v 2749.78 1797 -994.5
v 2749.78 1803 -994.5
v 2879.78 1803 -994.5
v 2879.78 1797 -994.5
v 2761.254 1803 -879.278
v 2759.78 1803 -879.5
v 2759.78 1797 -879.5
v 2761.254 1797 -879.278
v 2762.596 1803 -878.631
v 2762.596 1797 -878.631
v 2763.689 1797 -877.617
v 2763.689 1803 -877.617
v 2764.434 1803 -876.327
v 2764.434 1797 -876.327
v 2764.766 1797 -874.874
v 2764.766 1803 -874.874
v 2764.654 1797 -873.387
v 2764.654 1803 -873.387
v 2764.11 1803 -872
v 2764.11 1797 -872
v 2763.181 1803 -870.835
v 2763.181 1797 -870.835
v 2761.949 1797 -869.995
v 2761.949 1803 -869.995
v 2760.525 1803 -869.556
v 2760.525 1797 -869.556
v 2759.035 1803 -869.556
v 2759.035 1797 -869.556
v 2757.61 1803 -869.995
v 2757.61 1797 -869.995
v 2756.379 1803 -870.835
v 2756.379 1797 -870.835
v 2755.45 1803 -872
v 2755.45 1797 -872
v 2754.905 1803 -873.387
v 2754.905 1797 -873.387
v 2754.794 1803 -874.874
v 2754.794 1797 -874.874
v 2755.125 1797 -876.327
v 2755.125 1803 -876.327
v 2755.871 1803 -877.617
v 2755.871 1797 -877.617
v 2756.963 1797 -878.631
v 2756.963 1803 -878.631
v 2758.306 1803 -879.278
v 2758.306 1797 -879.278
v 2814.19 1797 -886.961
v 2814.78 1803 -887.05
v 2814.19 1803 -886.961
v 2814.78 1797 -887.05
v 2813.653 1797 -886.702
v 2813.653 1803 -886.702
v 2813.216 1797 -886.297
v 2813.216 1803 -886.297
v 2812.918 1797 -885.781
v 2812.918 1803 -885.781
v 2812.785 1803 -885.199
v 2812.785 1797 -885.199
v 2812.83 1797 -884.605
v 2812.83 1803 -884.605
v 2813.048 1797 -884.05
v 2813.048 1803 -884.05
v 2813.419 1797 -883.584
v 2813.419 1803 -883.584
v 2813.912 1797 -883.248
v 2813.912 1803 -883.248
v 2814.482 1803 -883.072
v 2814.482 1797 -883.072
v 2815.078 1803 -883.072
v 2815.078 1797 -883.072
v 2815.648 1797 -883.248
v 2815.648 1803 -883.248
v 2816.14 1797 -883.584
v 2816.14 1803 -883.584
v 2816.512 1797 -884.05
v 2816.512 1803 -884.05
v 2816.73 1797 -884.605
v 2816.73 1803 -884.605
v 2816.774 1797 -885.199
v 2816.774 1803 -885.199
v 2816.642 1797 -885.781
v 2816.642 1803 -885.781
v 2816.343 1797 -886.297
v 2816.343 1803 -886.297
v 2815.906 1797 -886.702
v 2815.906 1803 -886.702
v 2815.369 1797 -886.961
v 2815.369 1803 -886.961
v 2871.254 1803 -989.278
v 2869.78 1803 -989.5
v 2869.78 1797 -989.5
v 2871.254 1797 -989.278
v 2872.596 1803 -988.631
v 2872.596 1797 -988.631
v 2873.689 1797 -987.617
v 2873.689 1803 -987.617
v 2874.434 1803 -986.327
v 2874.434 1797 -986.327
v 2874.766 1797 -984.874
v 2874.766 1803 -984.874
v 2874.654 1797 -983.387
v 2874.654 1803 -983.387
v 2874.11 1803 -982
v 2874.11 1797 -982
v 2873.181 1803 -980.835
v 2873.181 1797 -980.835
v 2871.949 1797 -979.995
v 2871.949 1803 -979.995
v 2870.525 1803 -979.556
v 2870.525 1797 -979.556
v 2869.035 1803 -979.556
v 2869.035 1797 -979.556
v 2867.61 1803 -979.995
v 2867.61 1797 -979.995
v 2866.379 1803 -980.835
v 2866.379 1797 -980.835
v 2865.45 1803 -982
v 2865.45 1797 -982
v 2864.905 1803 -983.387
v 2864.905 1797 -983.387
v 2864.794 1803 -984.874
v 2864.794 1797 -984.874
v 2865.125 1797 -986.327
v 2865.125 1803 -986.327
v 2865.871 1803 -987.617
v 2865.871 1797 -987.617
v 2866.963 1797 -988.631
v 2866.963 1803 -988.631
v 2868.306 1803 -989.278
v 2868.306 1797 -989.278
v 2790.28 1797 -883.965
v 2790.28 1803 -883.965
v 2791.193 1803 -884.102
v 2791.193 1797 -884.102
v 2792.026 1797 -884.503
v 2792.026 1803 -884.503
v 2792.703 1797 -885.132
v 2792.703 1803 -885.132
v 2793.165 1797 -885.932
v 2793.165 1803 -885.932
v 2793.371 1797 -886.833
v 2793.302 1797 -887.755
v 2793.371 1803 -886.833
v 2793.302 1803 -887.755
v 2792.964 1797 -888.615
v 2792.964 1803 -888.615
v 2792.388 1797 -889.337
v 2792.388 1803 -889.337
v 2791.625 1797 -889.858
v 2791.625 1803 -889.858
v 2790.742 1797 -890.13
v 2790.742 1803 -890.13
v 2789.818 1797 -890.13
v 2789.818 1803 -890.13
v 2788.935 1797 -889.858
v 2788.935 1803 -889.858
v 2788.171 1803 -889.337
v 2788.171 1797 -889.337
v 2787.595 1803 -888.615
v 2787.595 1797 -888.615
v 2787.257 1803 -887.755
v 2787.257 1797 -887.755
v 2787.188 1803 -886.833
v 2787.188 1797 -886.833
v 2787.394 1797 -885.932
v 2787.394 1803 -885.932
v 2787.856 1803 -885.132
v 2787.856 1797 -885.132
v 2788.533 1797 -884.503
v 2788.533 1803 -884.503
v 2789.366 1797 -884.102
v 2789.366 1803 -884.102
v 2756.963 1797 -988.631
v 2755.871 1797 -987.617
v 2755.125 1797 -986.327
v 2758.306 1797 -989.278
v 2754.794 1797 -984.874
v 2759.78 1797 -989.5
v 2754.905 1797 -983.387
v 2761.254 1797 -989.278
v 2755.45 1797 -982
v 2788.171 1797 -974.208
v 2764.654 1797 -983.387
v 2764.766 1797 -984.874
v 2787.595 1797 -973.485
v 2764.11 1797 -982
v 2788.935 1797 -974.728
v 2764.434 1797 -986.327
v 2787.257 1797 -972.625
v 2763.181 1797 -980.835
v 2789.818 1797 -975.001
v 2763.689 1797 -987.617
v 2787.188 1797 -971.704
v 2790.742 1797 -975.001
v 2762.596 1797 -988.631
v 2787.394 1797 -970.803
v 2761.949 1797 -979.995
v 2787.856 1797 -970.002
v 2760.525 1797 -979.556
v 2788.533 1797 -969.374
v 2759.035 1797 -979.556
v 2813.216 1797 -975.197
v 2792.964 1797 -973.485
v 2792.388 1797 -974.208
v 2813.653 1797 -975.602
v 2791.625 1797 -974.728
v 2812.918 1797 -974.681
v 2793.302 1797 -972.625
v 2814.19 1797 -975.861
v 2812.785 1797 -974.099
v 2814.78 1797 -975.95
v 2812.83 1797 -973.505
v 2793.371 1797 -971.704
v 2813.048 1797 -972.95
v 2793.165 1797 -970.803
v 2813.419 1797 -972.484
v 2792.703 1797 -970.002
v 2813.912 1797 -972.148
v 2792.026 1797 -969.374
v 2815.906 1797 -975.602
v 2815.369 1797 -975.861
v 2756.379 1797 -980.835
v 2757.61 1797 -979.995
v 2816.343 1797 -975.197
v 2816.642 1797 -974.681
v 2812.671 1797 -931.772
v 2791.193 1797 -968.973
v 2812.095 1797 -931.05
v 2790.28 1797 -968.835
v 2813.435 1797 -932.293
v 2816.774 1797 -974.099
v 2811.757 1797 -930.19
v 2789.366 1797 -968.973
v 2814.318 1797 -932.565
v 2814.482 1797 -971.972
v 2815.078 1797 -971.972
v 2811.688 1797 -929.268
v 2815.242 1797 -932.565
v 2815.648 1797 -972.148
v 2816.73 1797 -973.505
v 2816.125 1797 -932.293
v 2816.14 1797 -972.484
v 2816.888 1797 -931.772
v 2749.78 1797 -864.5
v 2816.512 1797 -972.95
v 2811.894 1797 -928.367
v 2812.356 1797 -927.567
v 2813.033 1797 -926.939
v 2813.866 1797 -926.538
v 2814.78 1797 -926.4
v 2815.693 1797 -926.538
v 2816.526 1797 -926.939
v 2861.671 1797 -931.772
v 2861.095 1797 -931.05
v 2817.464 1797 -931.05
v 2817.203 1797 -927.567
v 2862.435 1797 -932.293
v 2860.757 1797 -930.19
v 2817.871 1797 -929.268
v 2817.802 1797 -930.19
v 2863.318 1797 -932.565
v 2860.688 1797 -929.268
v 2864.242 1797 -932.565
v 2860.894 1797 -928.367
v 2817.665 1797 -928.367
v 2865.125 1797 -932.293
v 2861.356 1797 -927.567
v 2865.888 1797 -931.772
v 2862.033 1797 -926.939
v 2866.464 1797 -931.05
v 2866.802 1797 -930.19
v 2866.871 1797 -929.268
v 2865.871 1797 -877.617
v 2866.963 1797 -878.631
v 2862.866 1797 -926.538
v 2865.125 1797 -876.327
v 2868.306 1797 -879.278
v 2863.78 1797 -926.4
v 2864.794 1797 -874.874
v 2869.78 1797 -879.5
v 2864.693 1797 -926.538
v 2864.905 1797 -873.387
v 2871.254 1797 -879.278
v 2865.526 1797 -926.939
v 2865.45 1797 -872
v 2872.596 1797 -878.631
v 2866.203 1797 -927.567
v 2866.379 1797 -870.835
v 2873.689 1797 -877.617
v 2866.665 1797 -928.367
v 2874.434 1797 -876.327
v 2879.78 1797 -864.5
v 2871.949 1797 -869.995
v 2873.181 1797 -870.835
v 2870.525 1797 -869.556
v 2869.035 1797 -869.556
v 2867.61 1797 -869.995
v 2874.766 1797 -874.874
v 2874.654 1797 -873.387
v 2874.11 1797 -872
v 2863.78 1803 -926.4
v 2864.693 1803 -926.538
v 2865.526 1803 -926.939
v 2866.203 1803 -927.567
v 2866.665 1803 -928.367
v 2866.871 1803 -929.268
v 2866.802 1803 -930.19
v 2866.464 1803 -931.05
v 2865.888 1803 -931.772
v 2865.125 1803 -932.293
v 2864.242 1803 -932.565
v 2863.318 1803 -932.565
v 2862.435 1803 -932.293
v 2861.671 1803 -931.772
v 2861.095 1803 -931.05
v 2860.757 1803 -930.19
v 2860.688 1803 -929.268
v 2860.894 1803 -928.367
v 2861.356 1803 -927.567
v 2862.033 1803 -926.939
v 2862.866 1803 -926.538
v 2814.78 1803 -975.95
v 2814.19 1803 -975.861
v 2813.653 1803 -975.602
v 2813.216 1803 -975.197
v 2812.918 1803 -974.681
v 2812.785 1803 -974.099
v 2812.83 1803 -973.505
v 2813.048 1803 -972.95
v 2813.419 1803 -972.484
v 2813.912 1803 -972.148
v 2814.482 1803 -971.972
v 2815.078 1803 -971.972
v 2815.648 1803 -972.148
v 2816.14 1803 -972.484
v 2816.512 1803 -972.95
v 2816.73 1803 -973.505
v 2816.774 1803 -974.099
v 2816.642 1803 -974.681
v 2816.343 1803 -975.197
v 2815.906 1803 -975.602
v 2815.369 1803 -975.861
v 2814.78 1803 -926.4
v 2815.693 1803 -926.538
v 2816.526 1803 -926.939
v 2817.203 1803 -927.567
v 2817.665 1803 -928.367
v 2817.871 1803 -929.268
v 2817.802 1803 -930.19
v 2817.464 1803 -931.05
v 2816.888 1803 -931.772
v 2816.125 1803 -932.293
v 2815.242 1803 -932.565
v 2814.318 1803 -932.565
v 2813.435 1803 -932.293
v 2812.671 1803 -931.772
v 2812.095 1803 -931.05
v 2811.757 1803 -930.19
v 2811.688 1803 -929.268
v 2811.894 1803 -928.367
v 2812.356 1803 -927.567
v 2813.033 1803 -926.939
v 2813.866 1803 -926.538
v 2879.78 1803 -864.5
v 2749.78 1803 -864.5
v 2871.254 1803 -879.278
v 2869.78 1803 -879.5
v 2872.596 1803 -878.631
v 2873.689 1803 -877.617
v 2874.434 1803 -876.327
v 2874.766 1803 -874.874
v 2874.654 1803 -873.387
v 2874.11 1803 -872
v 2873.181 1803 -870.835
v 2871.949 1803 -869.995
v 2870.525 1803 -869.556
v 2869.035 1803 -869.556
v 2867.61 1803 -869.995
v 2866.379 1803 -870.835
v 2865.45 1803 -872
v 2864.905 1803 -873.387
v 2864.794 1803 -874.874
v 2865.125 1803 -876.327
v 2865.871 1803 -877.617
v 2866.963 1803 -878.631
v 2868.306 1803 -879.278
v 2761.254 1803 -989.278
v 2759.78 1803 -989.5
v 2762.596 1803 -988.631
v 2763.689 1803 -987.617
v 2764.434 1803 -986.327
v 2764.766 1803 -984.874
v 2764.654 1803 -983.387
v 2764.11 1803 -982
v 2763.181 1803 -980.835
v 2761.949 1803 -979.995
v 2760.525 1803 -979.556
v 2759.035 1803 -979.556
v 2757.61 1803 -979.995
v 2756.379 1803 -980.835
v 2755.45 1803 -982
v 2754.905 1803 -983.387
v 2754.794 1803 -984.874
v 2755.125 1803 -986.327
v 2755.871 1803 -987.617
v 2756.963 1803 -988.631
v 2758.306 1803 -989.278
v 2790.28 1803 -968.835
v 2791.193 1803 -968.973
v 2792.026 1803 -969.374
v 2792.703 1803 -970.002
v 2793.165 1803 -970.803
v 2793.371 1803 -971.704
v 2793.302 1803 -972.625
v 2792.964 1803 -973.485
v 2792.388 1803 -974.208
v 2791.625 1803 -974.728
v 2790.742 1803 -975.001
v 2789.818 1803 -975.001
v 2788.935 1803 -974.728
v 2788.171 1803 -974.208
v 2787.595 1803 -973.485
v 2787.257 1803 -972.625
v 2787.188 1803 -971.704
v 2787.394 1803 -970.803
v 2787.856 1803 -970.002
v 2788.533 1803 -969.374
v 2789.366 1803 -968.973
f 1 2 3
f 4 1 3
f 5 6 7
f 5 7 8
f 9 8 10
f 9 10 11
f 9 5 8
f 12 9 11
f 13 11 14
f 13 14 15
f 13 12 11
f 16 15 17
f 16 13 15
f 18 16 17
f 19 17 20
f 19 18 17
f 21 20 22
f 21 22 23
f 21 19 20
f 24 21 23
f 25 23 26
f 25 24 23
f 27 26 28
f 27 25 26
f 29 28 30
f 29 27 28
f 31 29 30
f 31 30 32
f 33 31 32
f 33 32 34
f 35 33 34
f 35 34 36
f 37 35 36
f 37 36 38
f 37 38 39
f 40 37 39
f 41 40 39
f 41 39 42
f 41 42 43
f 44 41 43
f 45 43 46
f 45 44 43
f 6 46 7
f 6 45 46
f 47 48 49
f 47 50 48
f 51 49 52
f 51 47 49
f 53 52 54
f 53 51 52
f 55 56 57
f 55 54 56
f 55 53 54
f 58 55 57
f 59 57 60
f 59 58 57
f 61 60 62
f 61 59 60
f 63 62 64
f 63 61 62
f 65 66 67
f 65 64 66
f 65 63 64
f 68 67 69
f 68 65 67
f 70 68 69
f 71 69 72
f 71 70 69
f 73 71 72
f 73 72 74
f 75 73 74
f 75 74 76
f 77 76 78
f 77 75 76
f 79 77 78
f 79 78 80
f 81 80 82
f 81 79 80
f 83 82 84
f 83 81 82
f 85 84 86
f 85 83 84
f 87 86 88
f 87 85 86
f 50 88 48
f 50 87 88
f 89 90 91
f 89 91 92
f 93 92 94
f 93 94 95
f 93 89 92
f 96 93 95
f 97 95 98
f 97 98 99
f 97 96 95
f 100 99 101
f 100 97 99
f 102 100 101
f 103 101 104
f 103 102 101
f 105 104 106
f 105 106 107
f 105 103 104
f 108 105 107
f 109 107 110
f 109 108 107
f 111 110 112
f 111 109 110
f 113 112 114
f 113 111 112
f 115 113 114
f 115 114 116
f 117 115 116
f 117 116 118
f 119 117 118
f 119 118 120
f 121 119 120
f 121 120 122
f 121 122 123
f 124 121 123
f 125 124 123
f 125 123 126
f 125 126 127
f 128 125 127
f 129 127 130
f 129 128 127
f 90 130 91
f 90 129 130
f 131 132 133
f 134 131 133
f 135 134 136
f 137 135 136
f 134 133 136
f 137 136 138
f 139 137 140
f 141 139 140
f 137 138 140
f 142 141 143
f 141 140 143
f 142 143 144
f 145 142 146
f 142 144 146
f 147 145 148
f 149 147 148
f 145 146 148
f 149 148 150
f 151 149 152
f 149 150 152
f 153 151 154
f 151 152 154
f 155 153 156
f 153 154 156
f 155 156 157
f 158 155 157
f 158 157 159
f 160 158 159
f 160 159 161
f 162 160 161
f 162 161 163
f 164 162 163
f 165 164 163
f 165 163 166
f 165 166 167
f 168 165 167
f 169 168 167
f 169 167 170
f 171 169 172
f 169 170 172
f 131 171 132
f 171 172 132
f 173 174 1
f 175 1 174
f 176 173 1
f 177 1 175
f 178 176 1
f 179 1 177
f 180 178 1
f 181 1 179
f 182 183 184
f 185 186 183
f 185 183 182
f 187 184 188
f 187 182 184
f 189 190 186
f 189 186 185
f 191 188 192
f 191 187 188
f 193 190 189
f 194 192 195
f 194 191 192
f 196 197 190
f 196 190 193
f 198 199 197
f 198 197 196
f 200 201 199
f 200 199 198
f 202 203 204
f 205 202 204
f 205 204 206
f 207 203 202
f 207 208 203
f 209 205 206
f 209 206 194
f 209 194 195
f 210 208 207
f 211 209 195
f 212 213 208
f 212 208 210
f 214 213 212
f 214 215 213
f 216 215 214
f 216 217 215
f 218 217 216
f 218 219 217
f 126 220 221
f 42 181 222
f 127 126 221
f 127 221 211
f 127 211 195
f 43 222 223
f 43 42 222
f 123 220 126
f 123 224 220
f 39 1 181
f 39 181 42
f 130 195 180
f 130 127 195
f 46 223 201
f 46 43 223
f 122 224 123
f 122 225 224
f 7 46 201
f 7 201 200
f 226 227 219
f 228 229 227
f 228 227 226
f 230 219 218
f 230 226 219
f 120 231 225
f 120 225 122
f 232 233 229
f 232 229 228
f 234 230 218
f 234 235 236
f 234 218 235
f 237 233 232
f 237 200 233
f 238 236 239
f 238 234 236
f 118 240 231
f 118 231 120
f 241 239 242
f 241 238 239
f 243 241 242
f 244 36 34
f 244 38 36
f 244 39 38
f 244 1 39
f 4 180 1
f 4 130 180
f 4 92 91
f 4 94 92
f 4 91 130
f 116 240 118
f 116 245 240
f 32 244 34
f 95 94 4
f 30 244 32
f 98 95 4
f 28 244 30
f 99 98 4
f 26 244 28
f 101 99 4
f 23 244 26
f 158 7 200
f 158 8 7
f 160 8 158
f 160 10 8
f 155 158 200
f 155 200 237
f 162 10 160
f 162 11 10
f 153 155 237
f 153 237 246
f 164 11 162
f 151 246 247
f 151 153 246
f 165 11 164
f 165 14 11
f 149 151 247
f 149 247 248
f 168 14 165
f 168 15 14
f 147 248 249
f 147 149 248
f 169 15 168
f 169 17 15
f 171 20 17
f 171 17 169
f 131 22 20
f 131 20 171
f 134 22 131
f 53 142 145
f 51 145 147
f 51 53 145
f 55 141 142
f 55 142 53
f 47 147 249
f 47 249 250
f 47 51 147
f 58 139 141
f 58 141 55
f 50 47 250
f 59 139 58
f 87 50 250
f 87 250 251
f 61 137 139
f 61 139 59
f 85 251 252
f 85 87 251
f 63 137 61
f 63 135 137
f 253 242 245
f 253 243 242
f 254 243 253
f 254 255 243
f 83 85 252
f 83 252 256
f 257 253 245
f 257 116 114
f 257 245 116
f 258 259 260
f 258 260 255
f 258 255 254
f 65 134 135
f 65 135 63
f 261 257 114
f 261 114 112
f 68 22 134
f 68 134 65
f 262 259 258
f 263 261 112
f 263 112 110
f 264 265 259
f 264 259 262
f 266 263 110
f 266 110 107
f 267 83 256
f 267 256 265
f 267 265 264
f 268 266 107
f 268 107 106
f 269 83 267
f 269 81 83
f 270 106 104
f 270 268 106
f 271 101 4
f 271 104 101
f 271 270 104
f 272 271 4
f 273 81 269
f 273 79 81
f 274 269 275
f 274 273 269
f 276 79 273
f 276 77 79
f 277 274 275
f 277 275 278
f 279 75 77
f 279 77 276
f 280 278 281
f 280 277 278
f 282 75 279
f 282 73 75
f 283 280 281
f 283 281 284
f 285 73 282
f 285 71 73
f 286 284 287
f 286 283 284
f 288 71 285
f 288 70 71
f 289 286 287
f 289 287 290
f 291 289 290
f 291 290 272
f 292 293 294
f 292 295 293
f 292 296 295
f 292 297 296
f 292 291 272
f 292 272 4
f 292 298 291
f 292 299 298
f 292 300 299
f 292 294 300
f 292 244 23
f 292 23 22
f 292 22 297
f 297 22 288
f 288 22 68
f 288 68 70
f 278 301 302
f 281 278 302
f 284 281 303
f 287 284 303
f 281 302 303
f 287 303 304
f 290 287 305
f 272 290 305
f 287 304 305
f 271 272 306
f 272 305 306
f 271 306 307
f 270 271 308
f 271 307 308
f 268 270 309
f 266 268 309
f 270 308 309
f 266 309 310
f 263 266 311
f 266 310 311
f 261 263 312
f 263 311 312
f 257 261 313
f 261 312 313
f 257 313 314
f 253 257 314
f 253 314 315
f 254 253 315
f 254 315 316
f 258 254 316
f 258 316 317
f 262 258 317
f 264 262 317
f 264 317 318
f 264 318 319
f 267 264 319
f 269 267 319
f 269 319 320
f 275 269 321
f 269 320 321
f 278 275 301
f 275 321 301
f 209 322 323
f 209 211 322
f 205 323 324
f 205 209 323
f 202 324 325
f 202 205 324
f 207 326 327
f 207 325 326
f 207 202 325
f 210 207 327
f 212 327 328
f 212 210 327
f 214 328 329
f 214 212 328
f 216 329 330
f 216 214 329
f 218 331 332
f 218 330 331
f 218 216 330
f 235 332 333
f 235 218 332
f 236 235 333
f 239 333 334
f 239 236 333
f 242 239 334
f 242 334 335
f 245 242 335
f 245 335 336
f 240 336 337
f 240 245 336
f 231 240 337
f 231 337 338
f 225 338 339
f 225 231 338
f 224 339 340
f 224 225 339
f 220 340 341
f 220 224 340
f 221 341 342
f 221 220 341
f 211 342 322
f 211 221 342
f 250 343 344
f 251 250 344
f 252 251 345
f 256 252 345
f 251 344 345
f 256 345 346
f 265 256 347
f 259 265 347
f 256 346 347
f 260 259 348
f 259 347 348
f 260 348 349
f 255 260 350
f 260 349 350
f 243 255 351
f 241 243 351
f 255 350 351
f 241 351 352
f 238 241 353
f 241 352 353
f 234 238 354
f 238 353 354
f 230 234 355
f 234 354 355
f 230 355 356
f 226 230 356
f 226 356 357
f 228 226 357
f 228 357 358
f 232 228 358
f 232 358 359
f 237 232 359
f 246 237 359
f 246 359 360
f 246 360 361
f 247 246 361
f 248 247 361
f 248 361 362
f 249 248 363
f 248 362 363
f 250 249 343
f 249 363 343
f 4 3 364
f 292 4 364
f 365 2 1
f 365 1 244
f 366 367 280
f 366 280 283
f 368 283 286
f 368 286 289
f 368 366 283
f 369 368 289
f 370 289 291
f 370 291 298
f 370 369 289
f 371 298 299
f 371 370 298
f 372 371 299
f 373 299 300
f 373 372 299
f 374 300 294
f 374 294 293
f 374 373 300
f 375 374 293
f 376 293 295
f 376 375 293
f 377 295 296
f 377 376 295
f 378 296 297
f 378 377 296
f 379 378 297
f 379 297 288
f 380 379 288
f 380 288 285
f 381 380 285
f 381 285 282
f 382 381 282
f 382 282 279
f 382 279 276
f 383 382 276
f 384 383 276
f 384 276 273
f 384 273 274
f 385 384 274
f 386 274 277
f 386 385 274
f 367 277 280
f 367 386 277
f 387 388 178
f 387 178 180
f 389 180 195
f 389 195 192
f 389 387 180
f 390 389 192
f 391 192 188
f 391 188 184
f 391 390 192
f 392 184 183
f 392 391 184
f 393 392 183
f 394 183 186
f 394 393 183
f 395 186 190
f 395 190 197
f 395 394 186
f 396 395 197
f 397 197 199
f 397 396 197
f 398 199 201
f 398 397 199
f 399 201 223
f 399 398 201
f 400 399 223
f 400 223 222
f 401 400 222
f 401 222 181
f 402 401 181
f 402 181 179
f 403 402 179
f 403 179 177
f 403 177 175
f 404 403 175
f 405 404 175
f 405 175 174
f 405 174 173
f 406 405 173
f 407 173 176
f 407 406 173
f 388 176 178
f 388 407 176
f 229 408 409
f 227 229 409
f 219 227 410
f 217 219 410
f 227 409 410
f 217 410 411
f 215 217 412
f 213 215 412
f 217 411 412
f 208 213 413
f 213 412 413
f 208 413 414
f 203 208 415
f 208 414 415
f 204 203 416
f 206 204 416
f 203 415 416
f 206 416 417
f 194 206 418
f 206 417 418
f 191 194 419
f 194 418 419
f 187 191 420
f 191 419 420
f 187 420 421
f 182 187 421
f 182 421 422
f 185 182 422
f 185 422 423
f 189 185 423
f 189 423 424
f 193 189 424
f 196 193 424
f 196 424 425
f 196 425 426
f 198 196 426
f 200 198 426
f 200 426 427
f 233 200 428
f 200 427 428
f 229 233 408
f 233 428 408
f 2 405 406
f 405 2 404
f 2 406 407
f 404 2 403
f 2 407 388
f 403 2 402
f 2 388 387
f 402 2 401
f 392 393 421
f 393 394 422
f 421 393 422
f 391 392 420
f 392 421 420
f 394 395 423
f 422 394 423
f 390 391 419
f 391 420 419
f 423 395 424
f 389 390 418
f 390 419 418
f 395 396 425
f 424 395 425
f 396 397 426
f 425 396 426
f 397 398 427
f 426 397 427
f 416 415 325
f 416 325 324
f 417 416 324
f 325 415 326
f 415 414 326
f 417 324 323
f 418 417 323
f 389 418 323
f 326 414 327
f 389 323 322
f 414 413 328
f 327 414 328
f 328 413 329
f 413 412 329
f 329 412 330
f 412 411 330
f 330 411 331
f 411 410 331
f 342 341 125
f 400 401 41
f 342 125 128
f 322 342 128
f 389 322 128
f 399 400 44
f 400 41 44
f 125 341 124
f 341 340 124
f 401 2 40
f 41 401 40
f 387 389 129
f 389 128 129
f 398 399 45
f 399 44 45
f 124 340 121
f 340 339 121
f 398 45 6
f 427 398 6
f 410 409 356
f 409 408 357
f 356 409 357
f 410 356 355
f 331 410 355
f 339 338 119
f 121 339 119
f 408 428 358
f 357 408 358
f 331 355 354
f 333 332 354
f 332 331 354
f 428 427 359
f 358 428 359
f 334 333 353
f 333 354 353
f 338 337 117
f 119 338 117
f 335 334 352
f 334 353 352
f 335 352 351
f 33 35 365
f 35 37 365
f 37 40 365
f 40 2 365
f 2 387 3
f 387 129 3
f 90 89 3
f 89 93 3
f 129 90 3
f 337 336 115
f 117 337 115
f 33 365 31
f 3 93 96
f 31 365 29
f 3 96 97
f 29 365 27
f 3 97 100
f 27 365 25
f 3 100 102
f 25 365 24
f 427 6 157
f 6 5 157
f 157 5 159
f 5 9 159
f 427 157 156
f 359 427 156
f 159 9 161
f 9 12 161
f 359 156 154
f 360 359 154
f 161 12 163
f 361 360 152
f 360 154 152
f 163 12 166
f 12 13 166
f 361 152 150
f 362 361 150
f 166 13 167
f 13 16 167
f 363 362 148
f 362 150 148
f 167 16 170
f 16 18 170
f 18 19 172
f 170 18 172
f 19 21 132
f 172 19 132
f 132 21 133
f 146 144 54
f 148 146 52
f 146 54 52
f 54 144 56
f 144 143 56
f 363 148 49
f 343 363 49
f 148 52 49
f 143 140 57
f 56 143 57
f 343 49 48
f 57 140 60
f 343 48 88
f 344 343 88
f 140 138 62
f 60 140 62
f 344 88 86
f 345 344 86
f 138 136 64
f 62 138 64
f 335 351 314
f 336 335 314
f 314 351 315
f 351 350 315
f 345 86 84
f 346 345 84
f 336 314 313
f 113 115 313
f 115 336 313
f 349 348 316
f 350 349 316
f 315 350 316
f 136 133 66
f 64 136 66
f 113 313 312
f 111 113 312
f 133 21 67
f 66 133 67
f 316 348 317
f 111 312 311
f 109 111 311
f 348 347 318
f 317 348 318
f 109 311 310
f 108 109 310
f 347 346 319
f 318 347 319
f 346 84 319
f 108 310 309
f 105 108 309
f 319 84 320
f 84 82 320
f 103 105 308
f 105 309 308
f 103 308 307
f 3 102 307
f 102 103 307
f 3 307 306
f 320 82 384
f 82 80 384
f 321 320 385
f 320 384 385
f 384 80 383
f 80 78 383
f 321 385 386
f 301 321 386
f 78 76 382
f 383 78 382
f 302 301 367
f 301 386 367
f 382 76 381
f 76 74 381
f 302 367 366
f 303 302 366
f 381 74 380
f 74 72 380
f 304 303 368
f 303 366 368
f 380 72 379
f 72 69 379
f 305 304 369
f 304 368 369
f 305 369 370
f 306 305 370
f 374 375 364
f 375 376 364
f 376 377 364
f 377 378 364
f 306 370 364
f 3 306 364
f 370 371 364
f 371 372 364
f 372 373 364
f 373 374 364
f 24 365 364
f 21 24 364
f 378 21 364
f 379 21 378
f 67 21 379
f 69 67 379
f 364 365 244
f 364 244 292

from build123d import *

# Parameters (mm, degrees)
SKETCH_8_R          = 58
SKETCH_8_R_2        = 3
EXTRUDE_5_DEPTH     = 6
SKETCH_9_R          = 2
EXTRUDE_6_DEPTH     = 12
EXTRUDE_START       = -6
SKETCH_10_W         = 130
SKETCH_10_H         = 130
SKETCH_10_R         = 5
SKETCH_10_R_2       = 58
EXTRUDE_8_DEPTH     = 6
CUT_EXTRUDE_START   = -30
SKETCH_12_R         = 2
CUT_EXTRUDE_1_DEPTH = 30
SKETCH_13_R         = 2
CUT_EXTRUDE_2_DEPTH = 30
SKETCH_14_R         = 3.1
CUT_EXTRUDE_3_DEPTH = 6
SKETCH_15_R         = 3.1
CUT_EXTRUDE_4_DEPTH = 6


with BuildPart() as part:
    # 草图8 → 凸台-拉伸5 (new body)
    with BuildSketch(Plane.XZ.offset(-1803)):
        with Locations(Location((2814.779756067, -929.5, 0), (0, 0, 270))):
            Circle(SKETCH_8_R)
        with Locations(Location((2814.779756067, -929.5, 0), (0, 0, 270))):
            Circle(SKETCH_8_R_2, mode=Mode.SUBTRACT)
    extrude(amount=EXTRUDE_5_DEPTH)

    # 草图9 → 凸台-拉伸6 (add)
    with BuildSketch(Plane.XZ.offset(-1797)):
        with Locations(Location((2814.779756067, -885.05, 0), (0, 0, 270))):
            Circle(SKETCH_9_R)
        with Locations(Location((2814.779756067, -973.95, 0), (0, 0, 270))):
            Circle(SKETCH_9_R)
    extrude(amount=-EXTRUDE_6_DEPTH)

    # 草图10 → 凸台-拉伸8 (add)
    with BuildSketch(Plane.XZ.offset(-1797).offset(EXTRUDE_START)):
        with Locations((2814.779756067, -929.5)):
            Rectangle(SKETCH_10_W, SKETCH_10_H)
        with Locations(Location((2869.779756067, -984.5, 0), (0, 0, 270))):
            Circle(SKETCH_10_R, mode=Mode.SUBTRACT)
        with Locations(Location((2759.779756067, -984.5, 0), (0, 0, 270))):
            Circle(SKETCH_10_R, mode=Mode.SUBTRACT)
        with Locations(Location((2759.779756067, -874.5, 0), (0, 0, 270))):
            Circle(SKETCH_10_R, mode=Mode.SUBTRACT)
        with Locations(Location((2869.779756067, -874.5, 0), (0, 0, 270))):
            Circle(SKETCH_10_R, mode=Mode.SUBTRACT)
        with Locations((2814.779756067, -929.5)):
            Circle(SKETCH_10_R_2, mode=Mode.SUBTRACT)
    extrude(amount=EXTRUDE_8_DEPTH)

    # 草图12 → 切除-拉伸1 (cut)
    with BuildSketch(Plane(origin=(0, 1809, 0), x_dir=(1, 0, 0), z_dir=(0, 1, 0)).offset(CUT_EXTRUDE_START)):
        with Locations(Location((2814.779756067, 973.95, 0), (0, 0, 90))):
            Circle(SKETCH_12_R)
    extrude(amount=CUT_EXTRUDE_1_DEPTH, mode=Mode.SUBTRACT)

    # 草图13 → 切除-拉伸2 (cut)
    with BuildSketch(Plane(origin=(0, 1809, 0), x_dir=(1, 0, 0), z_dir=(0, 1, 0)).offset(CUT_EXTRUDE_START)):
        with Locations(Location((2814.779756067, 885.05, 0), (0, 0, 90))):
            Circle(SKETCH_13_R)
    extrude(amount=CUT_EXTRUDE_2_DEPTH, mode=Mode.SUBTRACT)

    # 草图14 → 切除-拉伸3 (cut)
    with BuildSketch(Plane(origin=(0, 1803, 0), x_dir=(1, 0, 0), z_dir=(0, 1, 0))):
        with Locations(Location((2814.779756067, 929.5, 0), (0, 0, 270))):
            Circle(SKETCH_14_R)
    extrude(amount=-CUT_EXTRUDE_3_DEPTH, mode=Mode.SUBTRACT)

    # 草图15 → 切除-拉伸4 (cut)
    with BuildSketch(Plane(origin=(0, 1803, 0), x_dir=(1, 0, 0), z_dir=(0, 1, 0))):
        with Locations(Location((2863.779756067, 929.5, 0), (0, 0, 270))):
            Circle(SKETCH_15_R)
        with Locations(Location((2790.279756067, 887.064755215, 0), (0, 0, 270))):
            Circle(SKETCH_15_R)
        with Locations(Location((2790.279756067, 971.935244785, 0), (0, 0, 270))):
            Circle(SKETCH_15_R)
    extrude(amount=-CUT_EXTRUDE_4_DEPTH, mode=Mode.SUBTRACT)


solid = part.part
